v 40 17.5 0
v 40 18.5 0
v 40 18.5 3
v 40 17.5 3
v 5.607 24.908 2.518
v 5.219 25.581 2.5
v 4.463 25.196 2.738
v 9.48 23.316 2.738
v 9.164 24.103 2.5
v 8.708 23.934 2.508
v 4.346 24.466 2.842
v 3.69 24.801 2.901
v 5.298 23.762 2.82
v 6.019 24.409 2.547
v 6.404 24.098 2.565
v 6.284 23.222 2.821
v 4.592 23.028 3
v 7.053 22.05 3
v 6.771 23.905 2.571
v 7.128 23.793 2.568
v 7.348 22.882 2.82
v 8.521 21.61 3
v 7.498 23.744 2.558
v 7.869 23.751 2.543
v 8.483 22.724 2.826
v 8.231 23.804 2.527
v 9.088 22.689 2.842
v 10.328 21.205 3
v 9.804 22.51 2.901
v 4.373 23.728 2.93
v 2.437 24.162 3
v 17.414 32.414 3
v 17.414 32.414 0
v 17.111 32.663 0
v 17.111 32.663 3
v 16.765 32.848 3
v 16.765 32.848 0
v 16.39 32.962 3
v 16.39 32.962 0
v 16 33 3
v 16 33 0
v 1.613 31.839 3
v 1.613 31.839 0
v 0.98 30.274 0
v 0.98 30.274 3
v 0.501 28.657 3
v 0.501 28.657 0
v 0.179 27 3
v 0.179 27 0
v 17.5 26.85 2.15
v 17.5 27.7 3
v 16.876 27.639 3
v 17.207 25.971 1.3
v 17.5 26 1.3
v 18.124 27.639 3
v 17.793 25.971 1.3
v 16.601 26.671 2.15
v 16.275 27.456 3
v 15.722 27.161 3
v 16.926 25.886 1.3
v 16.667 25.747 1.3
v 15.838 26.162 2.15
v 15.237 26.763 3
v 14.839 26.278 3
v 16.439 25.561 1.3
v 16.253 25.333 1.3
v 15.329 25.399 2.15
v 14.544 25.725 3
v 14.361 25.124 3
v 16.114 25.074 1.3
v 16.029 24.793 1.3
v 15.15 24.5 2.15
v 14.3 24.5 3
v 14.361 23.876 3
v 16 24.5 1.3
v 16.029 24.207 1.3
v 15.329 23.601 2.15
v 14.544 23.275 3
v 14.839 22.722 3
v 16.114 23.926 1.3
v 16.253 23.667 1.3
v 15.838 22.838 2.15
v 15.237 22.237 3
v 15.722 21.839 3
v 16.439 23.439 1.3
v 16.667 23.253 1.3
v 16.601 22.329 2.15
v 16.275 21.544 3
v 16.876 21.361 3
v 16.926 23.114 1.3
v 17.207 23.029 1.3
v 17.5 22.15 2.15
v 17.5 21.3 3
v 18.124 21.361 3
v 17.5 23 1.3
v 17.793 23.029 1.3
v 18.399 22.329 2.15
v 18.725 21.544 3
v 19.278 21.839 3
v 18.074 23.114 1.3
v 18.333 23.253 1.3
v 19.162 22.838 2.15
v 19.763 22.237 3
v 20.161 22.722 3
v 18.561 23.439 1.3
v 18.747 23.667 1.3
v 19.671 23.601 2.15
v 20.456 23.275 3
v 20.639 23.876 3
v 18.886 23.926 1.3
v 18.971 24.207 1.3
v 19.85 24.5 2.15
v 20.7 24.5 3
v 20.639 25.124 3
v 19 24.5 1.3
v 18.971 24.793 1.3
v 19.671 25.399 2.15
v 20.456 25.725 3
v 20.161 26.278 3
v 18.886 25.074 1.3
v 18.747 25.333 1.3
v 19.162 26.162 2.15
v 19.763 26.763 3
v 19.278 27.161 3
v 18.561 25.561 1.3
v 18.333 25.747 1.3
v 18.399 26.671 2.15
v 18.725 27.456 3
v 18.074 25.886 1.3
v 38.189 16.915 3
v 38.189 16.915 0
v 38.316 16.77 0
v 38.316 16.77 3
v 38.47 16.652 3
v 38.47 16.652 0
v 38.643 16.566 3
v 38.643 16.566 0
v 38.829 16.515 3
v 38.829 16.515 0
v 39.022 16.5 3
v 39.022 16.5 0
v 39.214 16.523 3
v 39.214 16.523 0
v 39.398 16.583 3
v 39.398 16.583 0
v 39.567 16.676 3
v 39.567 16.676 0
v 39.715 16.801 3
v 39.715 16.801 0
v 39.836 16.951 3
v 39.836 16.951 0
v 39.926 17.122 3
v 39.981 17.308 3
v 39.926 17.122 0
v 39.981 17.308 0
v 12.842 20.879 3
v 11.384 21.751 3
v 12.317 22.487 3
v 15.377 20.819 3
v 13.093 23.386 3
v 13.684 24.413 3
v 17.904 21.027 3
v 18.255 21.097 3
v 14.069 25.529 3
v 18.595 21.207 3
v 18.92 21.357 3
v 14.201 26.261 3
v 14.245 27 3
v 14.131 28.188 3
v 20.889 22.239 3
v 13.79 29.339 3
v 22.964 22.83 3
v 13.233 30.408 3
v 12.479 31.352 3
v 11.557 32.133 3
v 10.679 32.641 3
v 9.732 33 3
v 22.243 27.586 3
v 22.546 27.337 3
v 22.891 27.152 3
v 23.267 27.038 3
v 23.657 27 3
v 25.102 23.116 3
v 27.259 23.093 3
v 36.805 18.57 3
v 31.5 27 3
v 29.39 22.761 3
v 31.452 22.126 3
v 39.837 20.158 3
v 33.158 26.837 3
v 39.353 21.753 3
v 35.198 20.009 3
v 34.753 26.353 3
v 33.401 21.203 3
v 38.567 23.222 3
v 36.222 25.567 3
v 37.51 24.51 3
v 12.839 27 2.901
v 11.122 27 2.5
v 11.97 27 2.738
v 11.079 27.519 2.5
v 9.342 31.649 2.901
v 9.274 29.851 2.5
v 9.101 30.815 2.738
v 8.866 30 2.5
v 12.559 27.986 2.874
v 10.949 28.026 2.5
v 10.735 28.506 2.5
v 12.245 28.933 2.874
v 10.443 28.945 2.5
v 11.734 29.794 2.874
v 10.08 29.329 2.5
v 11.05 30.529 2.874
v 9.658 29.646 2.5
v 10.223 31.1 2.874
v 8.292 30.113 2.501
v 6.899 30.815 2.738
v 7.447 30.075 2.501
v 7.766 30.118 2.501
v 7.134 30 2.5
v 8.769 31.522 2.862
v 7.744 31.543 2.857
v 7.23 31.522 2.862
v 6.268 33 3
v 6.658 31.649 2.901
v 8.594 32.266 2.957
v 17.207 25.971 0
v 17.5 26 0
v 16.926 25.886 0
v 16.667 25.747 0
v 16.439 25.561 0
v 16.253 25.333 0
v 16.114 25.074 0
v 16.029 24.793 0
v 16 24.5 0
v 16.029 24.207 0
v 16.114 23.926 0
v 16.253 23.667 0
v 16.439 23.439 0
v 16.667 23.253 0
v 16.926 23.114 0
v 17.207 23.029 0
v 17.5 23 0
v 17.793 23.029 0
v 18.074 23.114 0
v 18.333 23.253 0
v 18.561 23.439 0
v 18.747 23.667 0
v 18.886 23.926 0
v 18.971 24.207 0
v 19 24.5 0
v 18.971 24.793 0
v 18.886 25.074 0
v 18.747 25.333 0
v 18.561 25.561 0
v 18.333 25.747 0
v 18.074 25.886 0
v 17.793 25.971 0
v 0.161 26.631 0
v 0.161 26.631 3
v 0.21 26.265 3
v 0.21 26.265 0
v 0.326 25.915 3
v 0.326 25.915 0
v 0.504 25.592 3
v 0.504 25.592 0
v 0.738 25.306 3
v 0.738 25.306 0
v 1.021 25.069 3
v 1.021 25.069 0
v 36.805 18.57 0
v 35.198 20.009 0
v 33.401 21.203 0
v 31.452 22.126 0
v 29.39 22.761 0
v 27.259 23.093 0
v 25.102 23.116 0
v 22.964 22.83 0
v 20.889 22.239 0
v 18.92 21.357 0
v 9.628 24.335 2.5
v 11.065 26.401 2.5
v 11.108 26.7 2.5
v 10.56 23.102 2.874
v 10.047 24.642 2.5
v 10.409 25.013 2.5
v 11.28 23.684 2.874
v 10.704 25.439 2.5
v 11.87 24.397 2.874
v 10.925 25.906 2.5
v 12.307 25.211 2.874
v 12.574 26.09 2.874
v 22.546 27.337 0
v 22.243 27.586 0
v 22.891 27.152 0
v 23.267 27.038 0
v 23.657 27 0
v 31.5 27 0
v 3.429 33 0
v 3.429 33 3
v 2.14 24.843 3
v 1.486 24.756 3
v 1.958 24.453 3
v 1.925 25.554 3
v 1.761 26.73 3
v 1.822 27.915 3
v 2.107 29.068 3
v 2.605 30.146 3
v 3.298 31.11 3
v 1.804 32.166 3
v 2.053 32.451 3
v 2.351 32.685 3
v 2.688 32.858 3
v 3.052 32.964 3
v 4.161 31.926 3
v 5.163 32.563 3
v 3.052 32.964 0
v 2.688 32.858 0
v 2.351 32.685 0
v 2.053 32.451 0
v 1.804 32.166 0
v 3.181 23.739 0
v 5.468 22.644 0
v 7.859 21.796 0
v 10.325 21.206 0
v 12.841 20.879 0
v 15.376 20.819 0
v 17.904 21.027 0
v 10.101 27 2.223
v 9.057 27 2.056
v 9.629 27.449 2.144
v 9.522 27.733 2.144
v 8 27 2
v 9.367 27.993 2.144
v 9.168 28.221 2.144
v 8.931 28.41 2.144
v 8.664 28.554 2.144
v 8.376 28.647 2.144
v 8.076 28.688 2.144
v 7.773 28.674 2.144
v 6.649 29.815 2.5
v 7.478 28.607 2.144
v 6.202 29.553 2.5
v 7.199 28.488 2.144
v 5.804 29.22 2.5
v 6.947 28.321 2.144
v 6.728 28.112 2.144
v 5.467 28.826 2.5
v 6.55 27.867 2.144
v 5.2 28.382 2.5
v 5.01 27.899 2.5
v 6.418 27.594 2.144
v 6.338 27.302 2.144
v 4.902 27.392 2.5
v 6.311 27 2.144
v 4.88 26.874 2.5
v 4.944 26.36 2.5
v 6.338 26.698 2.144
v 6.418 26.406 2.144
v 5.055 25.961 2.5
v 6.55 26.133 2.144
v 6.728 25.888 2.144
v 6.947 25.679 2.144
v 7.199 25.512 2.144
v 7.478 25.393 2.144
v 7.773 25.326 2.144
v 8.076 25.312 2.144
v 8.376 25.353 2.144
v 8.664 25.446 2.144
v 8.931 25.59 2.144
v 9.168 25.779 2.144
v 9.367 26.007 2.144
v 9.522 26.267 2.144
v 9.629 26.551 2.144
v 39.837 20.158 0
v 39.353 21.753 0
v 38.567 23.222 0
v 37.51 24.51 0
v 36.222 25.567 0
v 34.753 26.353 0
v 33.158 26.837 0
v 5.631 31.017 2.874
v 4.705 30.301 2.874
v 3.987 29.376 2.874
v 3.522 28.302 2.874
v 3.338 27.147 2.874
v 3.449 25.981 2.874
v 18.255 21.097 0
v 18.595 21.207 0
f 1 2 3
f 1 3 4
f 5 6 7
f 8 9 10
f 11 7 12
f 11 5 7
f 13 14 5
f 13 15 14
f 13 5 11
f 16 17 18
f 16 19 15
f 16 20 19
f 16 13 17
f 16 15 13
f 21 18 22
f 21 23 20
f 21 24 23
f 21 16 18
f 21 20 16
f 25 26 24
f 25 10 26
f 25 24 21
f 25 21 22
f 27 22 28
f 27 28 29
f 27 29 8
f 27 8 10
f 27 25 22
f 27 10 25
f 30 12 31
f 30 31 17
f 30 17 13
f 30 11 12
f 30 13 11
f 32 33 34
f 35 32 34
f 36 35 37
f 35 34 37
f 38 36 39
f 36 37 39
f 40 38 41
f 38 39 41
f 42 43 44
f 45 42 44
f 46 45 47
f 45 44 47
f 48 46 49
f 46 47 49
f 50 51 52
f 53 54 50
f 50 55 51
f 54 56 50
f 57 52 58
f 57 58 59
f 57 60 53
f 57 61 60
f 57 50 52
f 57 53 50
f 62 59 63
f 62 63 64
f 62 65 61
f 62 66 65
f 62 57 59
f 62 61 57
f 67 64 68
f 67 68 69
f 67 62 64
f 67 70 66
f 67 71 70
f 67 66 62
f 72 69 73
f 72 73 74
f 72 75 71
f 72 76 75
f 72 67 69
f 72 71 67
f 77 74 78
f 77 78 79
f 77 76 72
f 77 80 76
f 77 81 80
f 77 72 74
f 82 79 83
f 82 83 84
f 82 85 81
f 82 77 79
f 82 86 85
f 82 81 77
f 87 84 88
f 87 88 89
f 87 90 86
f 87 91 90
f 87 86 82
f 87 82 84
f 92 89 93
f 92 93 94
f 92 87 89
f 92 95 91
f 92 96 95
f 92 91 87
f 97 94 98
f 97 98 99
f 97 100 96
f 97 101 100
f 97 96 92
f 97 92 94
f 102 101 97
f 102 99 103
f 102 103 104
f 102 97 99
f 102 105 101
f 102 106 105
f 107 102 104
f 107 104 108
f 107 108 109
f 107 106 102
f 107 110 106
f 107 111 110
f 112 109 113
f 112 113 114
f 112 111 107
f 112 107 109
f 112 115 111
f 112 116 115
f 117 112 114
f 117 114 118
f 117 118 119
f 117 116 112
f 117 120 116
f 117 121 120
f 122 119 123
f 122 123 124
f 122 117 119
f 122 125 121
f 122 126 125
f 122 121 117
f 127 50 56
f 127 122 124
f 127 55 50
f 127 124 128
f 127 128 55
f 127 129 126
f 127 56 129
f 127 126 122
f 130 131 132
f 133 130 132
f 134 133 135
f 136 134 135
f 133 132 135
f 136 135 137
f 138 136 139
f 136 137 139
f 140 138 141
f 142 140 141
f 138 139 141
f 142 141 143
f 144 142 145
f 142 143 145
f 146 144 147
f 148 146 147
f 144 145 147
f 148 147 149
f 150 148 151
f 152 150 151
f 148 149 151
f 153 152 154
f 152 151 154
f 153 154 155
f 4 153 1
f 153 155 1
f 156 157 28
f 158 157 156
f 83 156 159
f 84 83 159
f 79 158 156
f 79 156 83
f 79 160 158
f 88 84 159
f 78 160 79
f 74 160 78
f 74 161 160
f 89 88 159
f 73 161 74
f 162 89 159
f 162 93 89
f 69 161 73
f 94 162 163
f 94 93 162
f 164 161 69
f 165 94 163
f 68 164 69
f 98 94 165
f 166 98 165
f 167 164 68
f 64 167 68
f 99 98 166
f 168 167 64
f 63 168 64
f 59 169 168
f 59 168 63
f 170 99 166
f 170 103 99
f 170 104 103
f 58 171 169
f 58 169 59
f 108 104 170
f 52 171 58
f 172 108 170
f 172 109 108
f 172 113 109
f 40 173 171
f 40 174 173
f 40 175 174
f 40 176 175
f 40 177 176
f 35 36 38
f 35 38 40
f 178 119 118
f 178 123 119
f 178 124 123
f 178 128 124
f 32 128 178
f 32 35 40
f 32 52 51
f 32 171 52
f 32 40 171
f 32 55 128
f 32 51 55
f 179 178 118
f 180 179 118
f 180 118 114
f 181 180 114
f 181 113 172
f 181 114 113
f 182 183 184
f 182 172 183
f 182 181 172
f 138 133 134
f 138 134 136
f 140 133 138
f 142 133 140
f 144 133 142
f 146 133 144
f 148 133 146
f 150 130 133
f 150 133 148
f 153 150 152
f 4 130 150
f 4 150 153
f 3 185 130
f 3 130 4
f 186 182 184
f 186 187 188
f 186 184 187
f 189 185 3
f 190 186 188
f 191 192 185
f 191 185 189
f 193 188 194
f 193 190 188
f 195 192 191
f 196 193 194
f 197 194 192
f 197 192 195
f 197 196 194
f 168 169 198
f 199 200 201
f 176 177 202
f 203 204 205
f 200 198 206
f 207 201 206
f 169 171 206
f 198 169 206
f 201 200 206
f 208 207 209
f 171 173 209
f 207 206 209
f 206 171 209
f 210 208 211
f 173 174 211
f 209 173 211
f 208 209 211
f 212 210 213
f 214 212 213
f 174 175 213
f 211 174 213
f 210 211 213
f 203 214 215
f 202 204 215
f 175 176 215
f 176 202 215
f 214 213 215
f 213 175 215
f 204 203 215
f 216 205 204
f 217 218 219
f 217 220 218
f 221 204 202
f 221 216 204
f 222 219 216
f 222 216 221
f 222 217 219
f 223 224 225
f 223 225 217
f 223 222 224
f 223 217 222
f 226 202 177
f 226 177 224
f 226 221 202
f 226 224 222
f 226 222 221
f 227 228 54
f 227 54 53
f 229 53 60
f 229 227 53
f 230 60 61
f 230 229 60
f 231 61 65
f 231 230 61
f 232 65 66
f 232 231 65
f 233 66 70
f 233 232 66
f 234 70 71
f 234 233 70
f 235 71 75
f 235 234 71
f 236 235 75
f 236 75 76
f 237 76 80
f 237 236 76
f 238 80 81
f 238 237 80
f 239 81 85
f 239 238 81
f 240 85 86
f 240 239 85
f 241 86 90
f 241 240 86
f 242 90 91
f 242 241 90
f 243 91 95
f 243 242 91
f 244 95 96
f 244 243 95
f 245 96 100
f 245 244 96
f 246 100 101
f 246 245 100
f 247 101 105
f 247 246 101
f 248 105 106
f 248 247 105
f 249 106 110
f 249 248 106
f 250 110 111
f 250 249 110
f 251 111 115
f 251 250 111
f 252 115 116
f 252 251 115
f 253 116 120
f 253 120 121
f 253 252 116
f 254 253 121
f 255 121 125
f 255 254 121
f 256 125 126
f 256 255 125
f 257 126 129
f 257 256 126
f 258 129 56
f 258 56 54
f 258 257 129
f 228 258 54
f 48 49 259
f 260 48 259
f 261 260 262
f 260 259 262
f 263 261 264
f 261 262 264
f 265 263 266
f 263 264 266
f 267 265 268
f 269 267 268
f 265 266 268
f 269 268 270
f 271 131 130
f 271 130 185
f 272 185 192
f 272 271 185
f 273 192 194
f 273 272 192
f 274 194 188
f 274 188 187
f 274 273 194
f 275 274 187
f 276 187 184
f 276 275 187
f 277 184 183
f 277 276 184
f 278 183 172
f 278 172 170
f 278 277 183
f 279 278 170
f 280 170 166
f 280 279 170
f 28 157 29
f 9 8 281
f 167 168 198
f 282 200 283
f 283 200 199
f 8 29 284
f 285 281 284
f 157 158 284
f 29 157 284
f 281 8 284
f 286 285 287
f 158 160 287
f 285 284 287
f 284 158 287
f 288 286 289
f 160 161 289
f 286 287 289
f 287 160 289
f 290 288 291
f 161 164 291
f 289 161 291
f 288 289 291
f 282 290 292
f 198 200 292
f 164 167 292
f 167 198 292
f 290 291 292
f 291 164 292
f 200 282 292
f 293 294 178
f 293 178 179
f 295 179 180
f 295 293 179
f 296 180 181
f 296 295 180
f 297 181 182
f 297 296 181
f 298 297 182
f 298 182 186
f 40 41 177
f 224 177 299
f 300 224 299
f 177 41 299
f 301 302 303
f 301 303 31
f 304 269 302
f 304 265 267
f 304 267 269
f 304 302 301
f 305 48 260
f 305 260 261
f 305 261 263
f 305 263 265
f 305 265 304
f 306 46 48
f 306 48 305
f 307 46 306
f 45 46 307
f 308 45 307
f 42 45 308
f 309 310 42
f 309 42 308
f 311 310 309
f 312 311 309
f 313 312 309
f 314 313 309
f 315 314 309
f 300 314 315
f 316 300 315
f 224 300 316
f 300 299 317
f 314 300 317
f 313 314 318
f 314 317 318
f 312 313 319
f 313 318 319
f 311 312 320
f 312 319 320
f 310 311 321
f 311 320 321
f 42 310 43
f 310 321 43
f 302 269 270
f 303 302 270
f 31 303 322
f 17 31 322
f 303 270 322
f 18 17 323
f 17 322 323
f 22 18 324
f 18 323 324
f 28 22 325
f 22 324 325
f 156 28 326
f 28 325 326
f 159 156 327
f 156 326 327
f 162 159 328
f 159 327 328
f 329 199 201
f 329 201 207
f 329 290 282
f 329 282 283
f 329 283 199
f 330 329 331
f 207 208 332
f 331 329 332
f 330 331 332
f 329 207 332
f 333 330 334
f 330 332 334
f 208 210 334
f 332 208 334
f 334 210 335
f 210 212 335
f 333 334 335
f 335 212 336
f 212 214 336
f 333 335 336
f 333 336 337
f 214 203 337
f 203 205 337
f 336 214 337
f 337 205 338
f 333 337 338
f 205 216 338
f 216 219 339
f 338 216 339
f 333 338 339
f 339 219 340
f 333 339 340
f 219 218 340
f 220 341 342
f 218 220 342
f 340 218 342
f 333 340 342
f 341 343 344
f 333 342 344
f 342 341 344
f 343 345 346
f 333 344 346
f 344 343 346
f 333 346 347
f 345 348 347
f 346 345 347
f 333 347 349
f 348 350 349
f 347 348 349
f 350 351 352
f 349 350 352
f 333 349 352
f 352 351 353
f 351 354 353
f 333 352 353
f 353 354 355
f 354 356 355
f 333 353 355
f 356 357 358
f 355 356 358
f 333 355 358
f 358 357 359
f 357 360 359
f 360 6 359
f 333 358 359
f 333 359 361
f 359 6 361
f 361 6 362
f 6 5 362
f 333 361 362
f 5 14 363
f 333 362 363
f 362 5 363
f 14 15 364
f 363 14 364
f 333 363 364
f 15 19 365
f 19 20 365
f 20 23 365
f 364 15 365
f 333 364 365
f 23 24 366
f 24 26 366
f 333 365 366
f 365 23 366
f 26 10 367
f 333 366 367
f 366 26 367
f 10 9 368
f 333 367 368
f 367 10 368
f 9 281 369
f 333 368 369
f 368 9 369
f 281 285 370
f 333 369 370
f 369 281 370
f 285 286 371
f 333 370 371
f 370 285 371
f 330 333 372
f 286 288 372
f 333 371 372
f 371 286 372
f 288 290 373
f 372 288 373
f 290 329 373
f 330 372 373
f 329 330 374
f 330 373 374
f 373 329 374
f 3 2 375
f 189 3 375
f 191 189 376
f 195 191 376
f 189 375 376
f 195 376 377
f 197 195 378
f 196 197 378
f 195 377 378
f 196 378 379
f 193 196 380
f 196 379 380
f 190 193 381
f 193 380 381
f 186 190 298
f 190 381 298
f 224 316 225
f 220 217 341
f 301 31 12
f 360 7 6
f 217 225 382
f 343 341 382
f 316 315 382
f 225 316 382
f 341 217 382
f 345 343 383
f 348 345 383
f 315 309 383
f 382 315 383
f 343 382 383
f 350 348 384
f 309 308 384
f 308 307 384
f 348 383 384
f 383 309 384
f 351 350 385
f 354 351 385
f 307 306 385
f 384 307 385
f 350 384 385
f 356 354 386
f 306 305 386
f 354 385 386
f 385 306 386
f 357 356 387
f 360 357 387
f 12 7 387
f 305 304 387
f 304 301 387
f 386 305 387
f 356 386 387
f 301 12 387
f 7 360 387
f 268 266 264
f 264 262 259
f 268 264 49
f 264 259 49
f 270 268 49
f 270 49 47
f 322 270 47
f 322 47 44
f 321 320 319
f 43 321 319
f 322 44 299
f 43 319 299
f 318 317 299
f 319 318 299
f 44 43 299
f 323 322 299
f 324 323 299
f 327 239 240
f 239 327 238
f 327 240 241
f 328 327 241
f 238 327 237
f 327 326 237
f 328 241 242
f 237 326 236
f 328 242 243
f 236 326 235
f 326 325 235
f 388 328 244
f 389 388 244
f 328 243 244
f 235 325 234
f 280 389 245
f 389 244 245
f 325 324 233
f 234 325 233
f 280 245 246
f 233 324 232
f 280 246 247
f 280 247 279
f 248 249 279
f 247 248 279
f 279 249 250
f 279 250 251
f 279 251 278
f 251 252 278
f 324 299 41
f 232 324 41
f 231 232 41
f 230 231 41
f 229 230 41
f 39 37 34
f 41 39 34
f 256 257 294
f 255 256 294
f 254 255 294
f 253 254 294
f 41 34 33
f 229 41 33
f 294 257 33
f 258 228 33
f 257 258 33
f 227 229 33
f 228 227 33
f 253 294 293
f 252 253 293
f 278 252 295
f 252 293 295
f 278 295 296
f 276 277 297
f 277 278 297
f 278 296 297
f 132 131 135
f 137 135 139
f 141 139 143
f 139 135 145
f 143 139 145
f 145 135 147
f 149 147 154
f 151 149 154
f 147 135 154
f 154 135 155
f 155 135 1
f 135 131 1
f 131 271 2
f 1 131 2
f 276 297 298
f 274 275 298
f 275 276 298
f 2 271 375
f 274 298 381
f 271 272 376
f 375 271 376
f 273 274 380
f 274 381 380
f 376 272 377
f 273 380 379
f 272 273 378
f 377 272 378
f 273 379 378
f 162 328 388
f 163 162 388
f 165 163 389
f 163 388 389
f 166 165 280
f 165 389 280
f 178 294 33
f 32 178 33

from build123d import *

# Parameters (mm, degrees)
PAD003_DEPTH = 3
FILLET_R     = 10


with BuildPart() as sphere:
    # Sphere → Sphere (revolve)
    with BuildSketch(Plane(origin=(8, 27, 12), x_dir=(1, 0, 0), z_dir=(0, -1, 0))):
        with BuildLine():
            ThreePointArc((0, -10), (10, 0), (0, 10))
            Line((0, 10), (0, -10))
        make_face()
    revolve(axis=Axis((8, 27, 12), (0, 0, 1)))


with BuildPart() as clone_of_countersunk002:
    # Sketch007 → Revolution001 (revolve)
    with BuildSketch(Plane.YZ):
        Polygon((3.2, 0), (1.5, -1.7), (1.5, -10), (0, -10), (0, 0), align=None)
    revolve(axis=Axis((0, 0, 0), (0, 0, 1)))


with BuildPart() as clone_of_countersunk002_1:
    # Clone005 placement: moved
    add(clone_of_countersunk002.part.moved(Location((17.5, 24.5, 3))))


with BuildPart() as samplefix:
    # Sketch → Pad003 (new body)
    with BuildSketch(Plane.XY):
        with BuildLine():
            ThreePointArc((17.903941, 21.027319), (18.426814, 21.146754), (18.920064, 21.357384))
            ThreePointArc((38.188772, 16.91527), (29.390013, 22.760914), (18.920064, 21.357384))
            ThreePointArc((38.188772, 16.91527), (39.30722, 16.548362), (40, 17.499993))
            Line((40, 18.499993), (40, 17.499993))
            ThreePointArc((40, 18.499993), (37.510407, 24.510406), (31.499995, 27))
            Line((23.656854, 27), (31.499995, 27))
            ThreePointArc((22.242641, 27.585786), (22.891487, 27.152241), (23.656854, 27))
            Line((22.242641, 27.585786), (17.414214, 32.414214))
            ThreePointArc((17.414214, 32.414214), (16.765367, 32.847759), (16, 33))
            Line((16, 33), (3.428753, 33))
            ThreePointArc((3.428753, 33), (2.351121, 32.684847), (1.613108, 31.83871))
            ThreePointArc((1.613108, 31.83871), (0.720961, 29.471304), (0.179492, 27))
            ThreePointArc((0.179492, 27), (0.325697, 25.914862), (1.021382, 25.069332))
            ThreePointArc((1.021382, 25.069332), (9.0844, 21.468416), (17.903941, 21.027319))
        make_face()
    extrude(amount=PAD003_DEPTH)

    # Cut003: cut Clone of Countersunk002
    add(clone_of_countersunk002_1.part, mode=Mode.SUBTRACT)

    # Cut004: cut Sphere
    add(sphere.part, mode=Mode.SUBTRACT)

    # Fillet
    fillet_edges = [samplefix.edges().sort_by_distance(p)[0] for p in [
        (3.641101, 27, 3),
    ]]
    fillet(fillet_edges, radius=FILLET_R)


solid = samplefix.part
